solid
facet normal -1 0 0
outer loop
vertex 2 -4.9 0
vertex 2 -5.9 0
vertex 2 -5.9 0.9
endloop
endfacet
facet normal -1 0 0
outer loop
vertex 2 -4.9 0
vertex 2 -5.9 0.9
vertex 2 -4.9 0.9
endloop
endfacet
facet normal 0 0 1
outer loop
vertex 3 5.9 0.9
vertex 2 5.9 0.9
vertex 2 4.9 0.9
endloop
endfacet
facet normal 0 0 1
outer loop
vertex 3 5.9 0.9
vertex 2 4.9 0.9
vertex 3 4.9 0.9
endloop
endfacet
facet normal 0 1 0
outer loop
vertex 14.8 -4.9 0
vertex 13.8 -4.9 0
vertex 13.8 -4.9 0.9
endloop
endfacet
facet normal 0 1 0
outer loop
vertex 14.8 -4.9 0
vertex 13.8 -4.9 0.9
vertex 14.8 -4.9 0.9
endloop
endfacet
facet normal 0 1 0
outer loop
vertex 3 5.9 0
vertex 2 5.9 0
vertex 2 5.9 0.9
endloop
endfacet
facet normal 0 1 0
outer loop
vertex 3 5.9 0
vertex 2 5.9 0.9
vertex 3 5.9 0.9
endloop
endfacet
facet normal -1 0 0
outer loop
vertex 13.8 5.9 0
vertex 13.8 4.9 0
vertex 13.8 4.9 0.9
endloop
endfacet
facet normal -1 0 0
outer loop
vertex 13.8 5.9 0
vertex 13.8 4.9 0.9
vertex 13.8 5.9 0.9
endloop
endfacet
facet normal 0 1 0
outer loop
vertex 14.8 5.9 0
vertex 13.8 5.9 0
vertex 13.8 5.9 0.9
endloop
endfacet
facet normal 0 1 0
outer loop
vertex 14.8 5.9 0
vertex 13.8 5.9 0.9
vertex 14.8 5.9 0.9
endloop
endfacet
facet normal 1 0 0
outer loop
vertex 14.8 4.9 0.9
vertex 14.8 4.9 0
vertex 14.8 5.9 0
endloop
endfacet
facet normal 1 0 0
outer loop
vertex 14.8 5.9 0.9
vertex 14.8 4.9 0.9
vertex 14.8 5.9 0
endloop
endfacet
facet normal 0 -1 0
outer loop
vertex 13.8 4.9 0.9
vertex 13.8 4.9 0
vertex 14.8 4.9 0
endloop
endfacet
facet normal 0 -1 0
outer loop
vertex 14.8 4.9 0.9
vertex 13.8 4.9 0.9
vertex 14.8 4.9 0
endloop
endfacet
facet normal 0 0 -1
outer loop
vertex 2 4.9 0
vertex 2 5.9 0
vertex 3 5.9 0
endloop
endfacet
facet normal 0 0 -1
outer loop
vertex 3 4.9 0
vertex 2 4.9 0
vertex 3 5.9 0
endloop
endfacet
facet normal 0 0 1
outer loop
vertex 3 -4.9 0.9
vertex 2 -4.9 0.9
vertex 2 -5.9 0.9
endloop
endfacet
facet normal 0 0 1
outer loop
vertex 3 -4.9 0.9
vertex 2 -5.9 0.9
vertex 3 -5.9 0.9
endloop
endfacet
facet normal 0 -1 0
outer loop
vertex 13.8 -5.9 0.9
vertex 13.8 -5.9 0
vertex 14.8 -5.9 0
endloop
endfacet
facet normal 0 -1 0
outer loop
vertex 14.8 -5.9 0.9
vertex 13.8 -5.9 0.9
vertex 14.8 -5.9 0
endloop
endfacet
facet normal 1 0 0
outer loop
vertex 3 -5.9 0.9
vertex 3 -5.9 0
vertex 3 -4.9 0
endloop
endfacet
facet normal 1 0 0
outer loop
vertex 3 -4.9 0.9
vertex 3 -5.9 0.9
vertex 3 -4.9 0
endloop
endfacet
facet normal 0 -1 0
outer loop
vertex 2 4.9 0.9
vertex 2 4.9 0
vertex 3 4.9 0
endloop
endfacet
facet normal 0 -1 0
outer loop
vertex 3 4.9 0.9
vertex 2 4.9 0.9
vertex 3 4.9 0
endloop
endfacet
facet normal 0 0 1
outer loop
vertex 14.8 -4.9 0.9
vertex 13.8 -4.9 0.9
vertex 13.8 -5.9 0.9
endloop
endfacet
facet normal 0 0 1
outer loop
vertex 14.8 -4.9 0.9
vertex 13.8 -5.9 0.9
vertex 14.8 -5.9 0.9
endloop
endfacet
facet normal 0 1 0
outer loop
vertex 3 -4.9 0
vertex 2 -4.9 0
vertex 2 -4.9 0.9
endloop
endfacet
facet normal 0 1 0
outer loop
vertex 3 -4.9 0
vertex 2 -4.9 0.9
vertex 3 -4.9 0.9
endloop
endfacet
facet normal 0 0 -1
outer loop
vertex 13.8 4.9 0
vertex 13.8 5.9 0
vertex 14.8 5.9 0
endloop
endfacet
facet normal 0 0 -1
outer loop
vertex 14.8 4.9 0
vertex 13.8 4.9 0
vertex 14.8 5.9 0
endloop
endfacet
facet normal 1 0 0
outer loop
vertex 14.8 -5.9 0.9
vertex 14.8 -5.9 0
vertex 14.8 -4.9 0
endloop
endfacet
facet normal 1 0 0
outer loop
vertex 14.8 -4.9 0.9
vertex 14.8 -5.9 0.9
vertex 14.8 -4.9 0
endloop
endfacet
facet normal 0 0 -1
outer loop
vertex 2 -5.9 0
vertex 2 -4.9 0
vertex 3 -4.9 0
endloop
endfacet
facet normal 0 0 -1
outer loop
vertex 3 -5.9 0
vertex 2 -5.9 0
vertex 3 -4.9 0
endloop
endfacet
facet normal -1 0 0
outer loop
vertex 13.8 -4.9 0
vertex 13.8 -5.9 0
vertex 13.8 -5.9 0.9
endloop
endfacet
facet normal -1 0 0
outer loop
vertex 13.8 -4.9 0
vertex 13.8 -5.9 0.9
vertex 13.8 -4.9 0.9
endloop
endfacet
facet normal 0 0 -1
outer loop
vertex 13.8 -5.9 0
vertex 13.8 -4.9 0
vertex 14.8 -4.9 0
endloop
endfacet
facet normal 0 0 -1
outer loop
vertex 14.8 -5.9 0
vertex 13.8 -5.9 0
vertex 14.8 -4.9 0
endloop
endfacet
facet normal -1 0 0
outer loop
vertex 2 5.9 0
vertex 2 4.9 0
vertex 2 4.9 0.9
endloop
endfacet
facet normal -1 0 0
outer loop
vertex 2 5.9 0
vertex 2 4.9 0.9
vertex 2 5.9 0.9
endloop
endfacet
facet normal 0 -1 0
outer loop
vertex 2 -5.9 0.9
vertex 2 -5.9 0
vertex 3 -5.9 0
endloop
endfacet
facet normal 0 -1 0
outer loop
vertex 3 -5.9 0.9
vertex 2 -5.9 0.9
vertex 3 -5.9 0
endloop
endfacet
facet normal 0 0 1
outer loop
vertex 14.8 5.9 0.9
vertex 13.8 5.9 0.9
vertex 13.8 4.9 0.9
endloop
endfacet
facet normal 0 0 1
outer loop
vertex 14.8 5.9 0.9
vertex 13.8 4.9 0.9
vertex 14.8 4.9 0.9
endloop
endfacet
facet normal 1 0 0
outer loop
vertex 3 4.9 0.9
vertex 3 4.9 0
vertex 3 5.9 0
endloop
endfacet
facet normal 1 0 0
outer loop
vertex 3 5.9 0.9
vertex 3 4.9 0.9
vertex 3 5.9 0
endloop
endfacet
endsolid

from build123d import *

# Parameters (mm, degrees)
BOX002_W     = 1
BOX002_H     = 1
BOX002_DEPTH = 0.9
BOX003_W     = 1
BOX003_H     = 1
BOX003_DEPTH = 0.9
BOX001_W     = 1
BOX001_H     = 1
BOX001_DEPTH = 0.9
BOX004_W     = 1
BOX004_H     = 1
BOX004_DEPTH = 0.9


with BuildPart() as cube002:
    # Box002 → Box002 (new body)
    with BuildSketch(Plane(origin=(13.8, 4.9, 0), x_dir=(1, 0, 0), z_dir=(0, 0, 1))):
        with Locations((0.5, 0.5)):
            Rectangle(BOX002_W, BOX002_H)
    extrude(amount=BOX002_DEPTH)


with BuildPart() as cube003:
    # Box003 → Box003 (new body)
    with BuildSketch(Plane(origin=(2, -5.9, 0), x_dir=(1, 0, 0), z_dir=(0, 0, 1))):
        with Locations((0.5, 0.5)):
            Rectangle(BOX003_W, BOX003_H)
    extrude(amount=BOX003_DEPTH)


with BuildPart() as cube001:
    # Box001 → Box001 (new body)
    with BuildSketch(Plane(origin=(2, 4.9, 0), x_dir=(1, 0, 0), z_dir=(0, 0, 1))):
        with Locations((0.5, 0.5)):
            Rectangle(BOX001_W, BOX001_H)
    extrude(amount=BOX001_DEPTH)


with BuildPart() as pods:
    # Box004 → Box004 (new body)
    with BuildSketch(Plane(origin=(13.8, -5.9, 0), x_dir=(1, 0, 0), z_dir=(0, 0, 1))):
        with Locations((0.5, 0.5)):
            Rectangle(BOX004_W, BOX004_H)
    extrude(amount=BOX004_DEPTH)

    # Fusion004: union Cube002, Cube003, Cube001
    add(cube002.part)
    add(cube003.part)
    add(cube001.part)


solid = pods.part
